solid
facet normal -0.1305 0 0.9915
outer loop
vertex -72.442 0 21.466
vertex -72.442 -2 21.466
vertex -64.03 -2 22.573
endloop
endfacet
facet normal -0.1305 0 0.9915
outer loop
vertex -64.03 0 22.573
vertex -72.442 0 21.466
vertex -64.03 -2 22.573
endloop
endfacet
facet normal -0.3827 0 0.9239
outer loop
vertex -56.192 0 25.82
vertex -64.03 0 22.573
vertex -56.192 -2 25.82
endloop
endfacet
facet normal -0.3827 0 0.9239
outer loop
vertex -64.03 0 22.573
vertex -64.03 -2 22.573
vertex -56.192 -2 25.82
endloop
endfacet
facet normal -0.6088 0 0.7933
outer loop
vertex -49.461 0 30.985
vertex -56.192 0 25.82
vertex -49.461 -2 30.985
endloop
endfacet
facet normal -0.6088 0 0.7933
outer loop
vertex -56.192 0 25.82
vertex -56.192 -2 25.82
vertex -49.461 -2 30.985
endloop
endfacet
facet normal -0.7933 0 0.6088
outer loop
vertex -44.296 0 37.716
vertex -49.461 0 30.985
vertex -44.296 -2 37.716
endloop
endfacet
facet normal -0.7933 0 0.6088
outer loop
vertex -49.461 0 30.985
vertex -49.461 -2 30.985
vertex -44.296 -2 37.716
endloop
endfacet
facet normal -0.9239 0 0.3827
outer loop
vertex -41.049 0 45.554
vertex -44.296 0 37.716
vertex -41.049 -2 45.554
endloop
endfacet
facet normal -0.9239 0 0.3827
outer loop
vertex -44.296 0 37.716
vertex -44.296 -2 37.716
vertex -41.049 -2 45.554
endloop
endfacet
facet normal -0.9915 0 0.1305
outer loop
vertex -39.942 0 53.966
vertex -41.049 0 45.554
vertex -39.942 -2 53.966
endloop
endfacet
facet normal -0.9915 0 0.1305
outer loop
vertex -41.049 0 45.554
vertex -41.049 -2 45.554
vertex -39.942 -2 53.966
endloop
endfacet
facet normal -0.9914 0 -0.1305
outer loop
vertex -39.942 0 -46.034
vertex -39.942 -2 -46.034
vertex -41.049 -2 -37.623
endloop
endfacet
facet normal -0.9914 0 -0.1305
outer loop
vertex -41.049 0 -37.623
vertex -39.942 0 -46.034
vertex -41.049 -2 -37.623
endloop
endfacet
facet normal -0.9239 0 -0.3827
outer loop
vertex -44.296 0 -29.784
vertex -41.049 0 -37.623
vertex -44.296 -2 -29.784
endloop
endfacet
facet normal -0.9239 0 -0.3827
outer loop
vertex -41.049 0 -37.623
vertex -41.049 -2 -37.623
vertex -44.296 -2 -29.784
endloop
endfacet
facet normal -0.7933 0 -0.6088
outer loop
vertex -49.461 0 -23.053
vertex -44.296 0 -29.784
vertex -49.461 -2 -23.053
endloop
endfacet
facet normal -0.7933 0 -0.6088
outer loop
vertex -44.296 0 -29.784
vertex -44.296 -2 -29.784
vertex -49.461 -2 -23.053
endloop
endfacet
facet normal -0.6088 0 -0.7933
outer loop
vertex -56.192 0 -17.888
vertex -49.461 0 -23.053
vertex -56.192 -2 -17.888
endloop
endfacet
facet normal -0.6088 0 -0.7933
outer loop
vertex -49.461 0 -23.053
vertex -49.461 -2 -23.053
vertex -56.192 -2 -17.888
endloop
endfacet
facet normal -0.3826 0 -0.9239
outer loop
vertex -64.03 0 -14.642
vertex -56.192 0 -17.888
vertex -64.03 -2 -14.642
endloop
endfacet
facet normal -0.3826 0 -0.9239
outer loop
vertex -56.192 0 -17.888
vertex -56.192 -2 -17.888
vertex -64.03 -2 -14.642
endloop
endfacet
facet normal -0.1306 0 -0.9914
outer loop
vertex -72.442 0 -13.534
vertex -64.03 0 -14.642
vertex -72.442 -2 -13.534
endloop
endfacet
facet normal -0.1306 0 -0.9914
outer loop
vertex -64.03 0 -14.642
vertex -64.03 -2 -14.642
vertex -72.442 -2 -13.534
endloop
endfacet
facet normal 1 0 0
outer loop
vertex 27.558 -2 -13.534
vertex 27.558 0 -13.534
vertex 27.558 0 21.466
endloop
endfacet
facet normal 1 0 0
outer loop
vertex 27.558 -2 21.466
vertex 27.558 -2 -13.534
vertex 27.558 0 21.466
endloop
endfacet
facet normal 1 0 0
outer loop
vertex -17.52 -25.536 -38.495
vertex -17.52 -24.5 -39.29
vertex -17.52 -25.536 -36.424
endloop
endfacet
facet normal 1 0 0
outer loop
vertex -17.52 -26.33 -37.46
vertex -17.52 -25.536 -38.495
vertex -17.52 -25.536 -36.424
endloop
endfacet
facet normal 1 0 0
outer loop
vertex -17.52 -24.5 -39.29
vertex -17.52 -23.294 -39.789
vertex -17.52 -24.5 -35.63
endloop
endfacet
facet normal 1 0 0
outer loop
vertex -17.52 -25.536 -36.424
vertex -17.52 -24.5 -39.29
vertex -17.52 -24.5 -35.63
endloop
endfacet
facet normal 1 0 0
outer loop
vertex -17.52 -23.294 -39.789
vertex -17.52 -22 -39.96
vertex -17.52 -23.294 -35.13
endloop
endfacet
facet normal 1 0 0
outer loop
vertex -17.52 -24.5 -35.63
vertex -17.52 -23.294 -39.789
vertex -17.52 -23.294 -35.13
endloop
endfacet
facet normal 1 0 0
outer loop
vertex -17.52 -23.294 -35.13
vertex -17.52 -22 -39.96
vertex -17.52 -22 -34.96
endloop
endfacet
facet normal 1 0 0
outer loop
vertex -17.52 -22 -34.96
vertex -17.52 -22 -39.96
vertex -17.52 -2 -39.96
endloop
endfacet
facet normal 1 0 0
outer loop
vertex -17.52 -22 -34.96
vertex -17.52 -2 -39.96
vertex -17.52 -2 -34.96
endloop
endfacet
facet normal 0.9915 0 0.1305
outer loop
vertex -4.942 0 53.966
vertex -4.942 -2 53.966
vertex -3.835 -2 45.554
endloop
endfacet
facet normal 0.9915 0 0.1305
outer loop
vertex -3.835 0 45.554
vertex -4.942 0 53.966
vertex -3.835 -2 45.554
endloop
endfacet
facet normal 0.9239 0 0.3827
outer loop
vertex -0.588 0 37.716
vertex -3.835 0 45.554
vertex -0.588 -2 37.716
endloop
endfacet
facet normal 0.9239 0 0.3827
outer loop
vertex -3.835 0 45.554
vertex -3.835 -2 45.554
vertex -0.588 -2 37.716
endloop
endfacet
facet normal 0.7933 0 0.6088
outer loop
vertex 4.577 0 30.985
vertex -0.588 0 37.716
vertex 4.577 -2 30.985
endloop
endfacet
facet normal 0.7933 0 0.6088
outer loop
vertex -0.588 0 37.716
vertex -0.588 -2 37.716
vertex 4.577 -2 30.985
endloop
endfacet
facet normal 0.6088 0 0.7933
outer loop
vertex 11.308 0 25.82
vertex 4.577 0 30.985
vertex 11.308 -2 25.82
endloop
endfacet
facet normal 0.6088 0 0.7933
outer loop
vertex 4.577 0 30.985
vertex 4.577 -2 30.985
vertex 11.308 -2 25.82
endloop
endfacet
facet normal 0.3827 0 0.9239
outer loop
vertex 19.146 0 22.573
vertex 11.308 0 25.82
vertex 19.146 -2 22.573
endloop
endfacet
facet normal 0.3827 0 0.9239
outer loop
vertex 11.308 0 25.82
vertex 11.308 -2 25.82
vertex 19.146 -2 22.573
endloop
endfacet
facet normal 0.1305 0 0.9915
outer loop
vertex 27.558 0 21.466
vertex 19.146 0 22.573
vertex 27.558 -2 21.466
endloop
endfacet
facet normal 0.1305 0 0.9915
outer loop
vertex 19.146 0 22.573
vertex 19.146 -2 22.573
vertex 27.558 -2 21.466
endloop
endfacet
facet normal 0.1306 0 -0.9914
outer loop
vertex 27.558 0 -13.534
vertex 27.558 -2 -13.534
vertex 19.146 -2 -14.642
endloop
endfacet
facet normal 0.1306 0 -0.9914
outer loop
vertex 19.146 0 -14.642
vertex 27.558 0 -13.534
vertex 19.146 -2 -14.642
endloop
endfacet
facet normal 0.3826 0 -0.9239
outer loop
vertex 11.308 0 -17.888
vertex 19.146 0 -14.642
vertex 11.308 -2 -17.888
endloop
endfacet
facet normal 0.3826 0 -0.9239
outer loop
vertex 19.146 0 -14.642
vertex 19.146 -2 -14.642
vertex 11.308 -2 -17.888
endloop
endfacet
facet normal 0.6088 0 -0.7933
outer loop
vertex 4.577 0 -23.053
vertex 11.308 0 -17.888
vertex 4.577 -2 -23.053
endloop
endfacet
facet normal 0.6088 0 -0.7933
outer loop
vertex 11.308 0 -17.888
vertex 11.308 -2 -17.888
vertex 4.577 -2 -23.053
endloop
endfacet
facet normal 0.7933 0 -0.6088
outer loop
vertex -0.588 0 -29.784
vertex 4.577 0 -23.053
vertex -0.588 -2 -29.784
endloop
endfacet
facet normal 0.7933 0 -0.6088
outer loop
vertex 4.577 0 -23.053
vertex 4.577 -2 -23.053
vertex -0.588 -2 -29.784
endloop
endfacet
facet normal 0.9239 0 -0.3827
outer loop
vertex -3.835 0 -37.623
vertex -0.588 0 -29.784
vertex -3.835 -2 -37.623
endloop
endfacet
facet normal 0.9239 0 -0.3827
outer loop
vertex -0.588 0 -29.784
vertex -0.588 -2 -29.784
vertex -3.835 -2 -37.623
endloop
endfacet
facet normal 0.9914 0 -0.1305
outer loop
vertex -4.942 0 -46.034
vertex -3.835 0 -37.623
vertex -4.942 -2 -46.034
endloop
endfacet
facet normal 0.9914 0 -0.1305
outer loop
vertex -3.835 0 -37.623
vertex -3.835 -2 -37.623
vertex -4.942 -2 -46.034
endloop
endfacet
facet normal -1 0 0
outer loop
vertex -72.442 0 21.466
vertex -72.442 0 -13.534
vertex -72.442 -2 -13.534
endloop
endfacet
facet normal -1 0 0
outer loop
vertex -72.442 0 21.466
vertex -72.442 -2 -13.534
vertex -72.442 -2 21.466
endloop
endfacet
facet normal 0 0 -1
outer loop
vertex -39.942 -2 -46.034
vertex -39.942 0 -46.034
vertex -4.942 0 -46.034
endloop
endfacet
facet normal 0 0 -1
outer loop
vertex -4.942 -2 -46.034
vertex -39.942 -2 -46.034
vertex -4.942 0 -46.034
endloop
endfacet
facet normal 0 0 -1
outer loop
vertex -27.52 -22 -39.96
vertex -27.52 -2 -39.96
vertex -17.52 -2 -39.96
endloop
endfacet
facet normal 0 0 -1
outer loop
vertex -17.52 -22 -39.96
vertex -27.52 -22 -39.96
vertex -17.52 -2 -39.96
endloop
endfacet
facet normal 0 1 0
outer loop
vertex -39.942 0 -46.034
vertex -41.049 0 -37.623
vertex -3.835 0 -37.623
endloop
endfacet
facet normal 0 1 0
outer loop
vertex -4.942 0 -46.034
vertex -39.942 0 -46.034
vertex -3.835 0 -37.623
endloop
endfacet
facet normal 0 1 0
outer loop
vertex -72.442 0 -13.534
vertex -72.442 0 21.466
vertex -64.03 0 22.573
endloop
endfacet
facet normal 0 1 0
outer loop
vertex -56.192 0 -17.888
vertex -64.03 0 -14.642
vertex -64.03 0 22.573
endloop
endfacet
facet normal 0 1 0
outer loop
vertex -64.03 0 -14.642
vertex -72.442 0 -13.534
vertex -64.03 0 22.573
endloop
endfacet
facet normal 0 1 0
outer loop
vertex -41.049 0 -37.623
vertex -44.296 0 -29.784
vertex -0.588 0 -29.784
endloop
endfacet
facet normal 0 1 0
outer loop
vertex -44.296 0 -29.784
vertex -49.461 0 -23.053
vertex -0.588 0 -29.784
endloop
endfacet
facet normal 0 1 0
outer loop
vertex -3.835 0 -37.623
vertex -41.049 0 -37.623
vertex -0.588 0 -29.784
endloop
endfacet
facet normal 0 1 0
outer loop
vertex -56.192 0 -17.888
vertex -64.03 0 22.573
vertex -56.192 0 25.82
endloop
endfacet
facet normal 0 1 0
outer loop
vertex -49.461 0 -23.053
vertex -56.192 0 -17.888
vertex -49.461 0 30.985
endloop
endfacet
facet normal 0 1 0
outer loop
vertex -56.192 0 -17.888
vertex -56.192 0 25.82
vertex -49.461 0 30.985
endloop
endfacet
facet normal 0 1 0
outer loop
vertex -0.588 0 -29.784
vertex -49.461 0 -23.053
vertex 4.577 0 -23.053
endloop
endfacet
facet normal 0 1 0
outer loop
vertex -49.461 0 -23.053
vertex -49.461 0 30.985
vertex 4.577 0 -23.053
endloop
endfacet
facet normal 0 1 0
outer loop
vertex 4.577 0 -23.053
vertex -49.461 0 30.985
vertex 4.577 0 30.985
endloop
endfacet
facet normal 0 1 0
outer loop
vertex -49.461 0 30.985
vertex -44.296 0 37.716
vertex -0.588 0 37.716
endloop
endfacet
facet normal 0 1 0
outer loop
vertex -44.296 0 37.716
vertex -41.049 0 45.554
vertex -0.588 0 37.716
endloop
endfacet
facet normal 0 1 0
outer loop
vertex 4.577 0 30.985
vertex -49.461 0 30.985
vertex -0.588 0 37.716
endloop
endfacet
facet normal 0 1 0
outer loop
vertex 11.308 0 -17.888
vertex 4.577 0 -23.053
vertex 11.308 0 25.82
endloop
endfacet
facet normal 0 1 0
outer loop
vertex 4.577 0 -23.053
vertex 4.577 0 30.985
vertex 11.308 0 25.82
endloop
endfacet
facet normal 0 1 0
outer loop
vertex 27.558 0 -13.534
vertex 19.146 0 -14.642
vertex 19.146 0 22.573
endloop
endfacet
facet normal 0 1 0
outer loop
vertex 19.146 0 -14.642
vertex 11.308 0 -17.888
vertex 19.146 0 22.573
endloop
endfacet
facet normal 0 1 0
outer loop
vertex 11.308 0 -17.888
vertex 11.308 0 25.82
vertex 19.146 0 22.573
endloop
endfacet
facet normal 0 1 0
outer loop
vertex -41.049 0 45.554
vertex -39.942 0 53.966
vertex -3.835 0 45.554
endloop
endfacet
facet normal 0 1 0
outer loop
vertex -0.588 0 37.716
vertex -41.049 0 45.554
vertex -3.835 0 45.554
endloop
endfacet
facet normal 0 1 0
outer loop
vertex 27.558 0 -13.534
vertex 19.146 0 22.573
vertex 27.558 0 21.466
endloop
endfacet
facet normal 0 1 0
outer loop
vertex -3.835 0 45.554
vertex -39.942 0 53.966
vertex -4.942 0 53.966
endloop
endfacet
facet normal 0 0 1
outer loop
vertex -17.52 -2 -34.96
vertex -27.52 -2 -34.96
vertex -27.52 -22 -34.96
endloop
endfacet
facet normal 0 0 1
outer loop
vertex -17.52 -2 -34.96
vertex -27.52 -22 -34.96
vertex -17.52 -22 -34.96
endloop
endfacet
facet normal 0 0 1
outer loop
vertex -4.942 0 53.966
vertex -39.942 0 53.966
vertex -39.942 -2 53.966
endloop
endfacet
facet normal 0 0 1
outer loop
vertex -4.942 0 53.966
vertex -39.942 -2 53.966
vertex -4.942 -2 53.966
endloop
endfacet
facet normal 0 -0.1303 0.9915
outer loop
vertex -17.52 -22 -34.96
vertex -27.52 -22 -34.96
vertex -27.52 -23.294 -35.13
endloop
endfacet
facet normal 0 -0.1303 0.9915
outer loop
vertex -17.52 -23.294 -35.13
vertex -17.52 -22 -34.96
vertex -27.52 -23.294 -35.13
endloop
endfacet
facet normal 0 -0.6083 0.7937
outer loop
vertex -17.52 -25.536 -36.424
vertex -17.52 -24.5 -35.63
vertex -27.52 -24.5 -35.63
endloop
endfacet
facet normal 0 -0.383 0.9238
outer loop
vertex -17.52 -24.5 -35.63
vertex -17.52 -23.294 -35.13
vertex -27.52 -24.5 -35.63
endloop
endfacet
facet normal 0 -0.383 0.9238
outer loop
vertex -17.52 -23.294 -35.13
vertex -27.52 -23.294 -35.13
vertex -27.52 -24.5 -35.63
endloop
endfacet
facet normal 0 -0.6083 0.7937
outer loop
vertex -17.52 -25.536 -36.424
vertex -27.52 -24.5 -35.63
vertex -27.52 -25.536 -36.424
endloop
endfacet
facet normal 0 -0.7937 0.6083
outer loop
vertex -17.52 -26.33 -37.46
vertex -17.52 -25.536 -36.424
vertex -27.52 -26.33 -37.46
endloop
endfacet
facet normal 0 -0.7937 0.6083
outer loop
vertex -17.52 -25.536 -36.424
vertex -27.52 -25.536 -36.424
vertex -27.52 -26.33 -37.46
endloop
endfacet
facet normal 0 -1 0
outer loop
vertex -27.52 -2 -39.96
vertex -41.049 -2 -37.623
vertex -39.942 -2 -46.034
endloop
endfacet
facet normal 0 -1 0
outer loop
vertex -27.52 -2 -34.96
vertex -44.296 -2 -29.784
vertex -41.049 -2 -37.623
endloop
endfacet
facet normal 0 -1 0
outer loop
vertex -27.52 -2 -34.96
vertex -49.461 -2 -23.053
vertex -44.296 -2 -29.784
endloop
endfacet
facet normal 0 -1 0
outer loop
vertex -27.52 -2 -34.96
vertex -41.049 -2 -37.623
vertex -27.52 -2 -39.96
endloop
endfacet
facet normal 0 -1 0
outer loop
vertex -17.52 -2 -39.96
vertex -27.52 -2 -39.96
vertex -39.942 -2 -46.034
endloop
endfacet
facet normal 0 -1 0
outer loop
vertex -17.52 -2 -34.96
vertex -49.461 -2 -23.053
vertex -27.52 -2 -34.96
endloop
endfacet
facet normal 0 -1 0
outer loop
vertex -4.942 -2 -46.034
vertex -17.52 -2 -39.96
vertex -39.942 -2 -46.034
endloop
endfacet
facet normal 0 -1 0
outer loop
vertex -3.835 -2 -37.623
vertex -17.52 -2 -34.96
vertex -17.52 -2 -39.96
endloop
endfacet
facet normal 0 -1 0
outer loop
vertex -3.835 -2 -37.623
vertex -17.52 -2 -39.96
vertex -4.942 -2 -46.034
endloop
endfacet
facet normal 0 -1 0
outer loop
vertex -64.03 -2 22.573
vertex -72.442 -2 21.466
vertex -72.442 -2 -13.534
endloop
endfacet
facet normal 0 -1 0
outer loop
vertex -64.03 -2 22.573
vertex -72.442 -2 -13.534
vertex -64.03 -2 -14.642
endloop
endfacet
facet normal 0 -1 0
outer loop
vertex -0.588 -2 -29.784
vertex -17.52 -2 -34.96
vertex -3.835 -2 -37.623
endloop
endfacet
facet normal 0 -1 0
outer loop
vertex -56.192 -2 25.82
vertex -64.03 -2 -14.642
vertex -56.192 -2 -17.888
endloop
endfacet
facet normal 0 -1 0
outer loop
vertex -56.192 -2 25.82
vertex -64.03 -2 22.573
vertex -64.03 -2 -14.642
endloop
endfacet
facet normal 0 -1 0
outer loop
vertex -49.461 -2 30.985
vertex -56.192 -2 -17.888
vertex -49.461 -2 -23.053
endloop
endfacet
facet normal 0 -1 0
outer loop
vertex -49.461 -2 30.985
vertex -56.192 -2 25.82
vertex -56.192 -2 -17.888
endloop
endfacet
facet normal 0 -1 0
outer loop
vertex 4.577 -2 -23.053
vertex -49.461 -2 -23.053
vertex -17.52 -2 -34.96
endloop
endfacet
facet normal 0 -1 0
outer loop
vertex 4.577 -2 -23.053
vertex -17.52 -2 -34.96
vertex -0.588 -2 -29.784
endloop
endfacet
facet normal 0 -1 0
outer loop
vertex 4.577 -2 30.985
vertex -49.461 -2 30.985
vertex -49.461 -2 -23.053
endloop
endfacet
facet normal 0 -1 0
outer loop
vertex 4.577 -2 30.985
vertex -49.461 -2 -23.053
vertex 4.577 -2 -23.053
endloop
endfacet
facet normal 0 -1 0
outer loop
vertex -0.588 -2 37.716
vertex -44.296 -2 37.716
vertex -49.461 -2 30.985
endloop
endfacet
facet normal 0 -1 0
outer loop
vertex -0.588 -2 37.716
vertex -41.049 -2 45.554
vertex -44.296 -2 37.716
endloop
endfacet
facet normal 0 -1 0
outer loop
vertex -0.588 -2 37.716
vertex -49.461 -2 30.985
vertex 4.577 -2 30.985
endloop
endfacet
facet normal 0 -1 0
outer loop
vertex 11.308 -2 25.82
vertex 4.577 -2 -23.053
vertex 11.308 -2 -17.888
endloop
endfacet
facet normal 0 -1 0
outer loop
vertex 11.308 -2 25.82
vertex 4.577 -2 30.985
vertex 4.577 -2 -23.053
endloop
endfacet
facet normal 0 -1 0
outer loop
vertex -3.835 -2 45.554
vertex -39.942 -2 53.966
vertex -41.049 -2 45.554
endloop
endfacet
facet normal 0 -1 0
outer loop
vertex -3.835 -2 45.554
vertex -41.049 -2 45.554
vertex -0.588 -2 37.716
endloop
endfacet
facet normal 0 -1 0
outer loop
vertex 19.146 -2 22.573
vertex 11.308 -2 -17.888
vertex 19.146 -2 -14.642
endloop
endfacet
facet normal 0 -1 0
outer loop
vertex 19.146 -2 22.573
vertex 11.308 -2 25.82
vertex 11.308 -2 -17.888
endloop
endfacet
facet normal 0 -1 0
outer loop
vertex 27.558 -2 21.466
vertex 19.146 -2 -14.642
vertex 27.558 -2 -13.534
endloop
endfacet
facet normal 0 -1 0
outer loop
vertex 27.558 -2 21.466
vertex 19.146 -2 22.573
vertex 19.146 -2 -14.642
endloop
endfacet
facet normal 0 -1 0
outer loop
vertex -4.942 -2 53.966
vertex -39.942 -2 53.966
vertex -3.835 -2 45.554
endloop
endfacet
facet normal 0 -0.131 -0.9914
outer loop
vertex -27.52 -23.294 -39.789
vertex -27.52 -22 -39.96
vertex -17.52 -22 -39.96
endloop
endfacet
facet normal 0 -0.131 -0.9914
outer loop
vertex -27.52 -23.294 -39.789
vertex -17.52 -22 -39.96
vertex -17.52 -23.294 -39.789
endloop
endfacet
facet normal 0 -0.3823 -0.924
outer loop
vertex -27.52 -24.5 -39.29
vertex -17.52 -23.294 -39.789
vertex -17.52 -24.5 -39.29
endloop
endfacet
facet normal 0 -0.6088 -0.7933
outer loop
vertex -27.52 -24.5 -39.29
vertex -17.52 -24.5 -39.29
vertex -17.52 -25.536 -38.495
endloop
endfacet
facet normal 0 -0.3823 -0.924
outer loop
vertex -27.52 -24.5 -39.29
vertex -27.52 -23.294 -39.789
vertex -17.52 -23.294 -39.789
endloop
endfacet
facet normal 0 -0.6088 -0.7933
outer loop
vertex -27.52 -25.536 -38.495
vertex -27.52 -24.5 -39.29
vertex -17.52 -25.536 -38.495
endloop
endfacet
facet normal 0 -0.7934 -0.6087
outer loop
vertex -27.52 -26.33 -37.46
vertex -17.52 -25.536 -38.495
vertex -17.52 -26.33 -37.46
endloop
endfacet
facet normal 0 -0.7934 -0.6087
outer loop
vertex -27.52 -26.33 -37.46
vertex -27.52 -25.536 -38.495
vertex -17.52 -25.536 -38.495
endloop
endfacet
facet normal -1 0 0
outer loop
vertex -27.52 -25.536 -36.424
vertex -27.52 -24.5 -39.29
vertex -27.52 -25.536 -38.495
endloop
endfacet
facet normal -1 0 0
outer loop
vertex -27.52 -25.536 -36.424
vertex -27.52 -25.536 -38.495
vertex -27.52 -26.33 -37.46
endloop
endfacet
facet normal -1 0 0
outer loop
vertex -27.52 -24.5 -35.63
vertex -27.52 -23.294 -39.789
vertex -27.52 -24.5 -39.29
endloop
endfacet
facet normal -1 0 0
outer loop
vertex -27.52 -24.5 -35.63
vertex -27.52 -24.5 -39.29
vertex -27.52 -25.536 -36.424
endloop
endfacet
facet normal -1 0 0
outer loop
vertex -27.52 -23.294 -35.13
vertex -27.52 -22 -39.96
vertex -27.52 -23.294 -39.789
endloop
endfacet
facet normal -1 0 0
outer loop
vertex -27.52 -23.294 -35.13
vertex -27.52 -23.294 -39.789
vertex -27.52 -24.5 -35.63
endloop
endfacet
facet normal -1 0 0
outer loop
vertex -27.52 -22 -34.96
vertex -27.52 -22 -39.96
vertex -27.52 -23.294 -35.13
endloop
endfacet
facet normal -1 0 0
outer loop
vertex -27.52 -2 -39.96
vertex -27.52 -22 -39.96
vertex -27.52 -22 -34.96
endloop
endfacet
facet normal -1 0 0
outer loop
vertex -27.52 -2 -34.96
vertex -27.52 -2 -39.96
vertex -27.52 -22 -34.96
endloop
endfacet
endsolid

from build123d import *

# Parameters (mm, degrees)
F0_W        = 100
F0_H        = 100
F1_DEPTH    = 2
F3_DEPTH    = 25
F5_DEPTH    = 25
F6_W        = 10
F6_H        = 5
F7_DEPTH    = 25
F8_T1_DEPTH = 35


# Not quite as in the source:
# - a fillet or chamfer that OpenCascade refuses, or shapes differently, is made with other operations: its cross-section is extruded or revolved along the edge and cut away or added


with BuildPart() as f1:
    # F0 (on Front) → F1 (new body)
    with BuildSketch(Plane.XZ):
        with Locations((-22.4419460681, 3.9658267051)):
            Rectangle(F0_W, F0_H)
    extrude(amount=F1_DEPTH)

    # F2 (on face) → F3 (cut)
    with BuildSketch(Plane.XZ.offset(2)):
        with BuildLine():
            ThreePointArc((-72.4419460681, -13.5341732949), (-95.4229164567, -69.0151436835), (-39.9419460681, -46.0341732949))
            Line((-39.9419460681, -46.0341732949), (-72.4419460681, -46.0341732949))
            Line((-72.4419460681, -46.0341732949), (-72.4419460681, -13.5341732949))
        make_face()
        with BuildLine():
            Line((-72.4419460681, 53.9658267051), (-39.9419460681, 53.9658267051))
            ThreePointArc((-39.9419460681, 53.9658267051), (-95.4229164567, 76.9467970937), (-72.4419460681, 21.4658267051))
            Line((-72.4419460681, 21.4658267051), (-72.4419460681, 53.9658267051))
        make_face()
        with BuildLine():
            ThreePointArc((-72.4419460681, 21.4658267051), (-49.4609756796, 30.9848563165), (-39.9419460681, 53.9658267051))
            Line((-39.9419460681, 53.9658267051), (-72.4419460681, 53.9658267051))
            Line((-72.4419460681, 53.9658267051), (-72.4419460681, 21.4658267051))
        make_face()
        with BuildLine():
            Line((27.5580539319, 53.9658267051), (27.5580539319, 21.4658267051))
            ThreePointArc((27.5580539319, 21.4658267051), (50.5390243204, 30.9848563165), (60.0580539319, 53.9658267051))
            ThreePointArc((60.0580539319, 53.9658267051), (27.5580539319, 86.4658267051), (-4.9419460681, 53.9658267051))
            Line((-4.9419460681, 53.9658267051), (27.5580539319, 53.9658267051))
        make_face()
        with BuildLine():
            ThreePointArc((-4.9419460681, 53.9658267051), (4.5770835433, 30.9848563165), (27.5580539319, 21.4658267051))
            Line((27.5580539319, 21.4658267051), (27.5580539319, 53.9658267051))
            Line((27.5580539319, 53.9658267051), (-4.9419460681, 53.9658267051))
        make_face()
        with BuildLine():
            ThreePointArc((-4.9419460681, -46.0341732949), (27.5580539319, -78.5341732949), (60.0580539319, -46.0341732949))
            ThreePointArc((60.0580539319, -46.0341732949), (50.5390243204, -23.0532029063), (27.5580539319, -13.5341732949))
            Line((27.5580539319, -13.5341732949), (27.5580539319, -46.0341732949))
            Line((27.5580539319, -46.0341732949), (-4.9419460681, -46.0341732949))
        make_face()
        with BuildLine():
            Line((27.5580539319, -46.0341732949), (27.5580539319, -13.5341732949))
            ThreePointArc((27.5580539319, -13.5341732949), (4.5770835433, -23.0532029063), (-4.9419460681, -46.0341732949))
            Line((-4.9419460681, -46.0341732949), (27.5580539319, -46.0341732949))
        make_face()
    extrude(amount=-F3_DEPTH, mode=Mode.SUBTRACT)

    # F4 (on face) → F5 (cut)
    with BuildSketch(Plane.XZ.offset(2)):
        with BuildLine():
            ThreePointArc((-72.4419460681, -13.5341732949), (-95.4229164567, -69.0151436835), (-39.9419460681, -46.0341732949))
            Line((-39.9419460681, -46.0341732949), (-72.4419460681, -46.0341732949))
            Line((-72.4419460681, -46.0341732949), (-72.4419460681, -13.5341732949))
        make_face()
        with BuildLine():
            Line((-72.4419460681, -46.0341732949), (-39.9419460681, -46.0341732949))
            ThreePointArc((-39.9419460681, -46.0341732949), (-49.4609756796, -23.0532029063), (-72.4419460681, -13.5341732949))
            Line((-72.4419460681, -13.5341732949), (-72.4419460681, -46.0341732949))
        make_face()
    extrude(amount=-F5_DEPTH, mode=Mode.SUBTRACT)

    # F6 (on face) → F7 (join)
    with BuildSketch(Plane.XZ.offset(2)):
        with Locations((-22.5202348083, -37.4598563993)):
            Rectangle(F6_W, F6_H)
    extrude(amount=F7_DEPTH)

    # F8: fillet of radius 5 on 2 edges, made by hand

    # F8_s2 → F8_t1 (cut)
    with BuildSketch(Plane.YZ.offset(-40.0202348083)):
        with BuildLine():
            ThreePointArc((-22, -34.9598563993), (-25.5355339059, -36.4243224934), (-27, -39.9598563993))
            Line((-27, -39.9598563993), (-27, -34.9598563993))
            Line((-27, -34.9598563993), (-22, -34.9598563993))
        make_face()
        with BuildLine():
            ThreePointArc((-22, -39.9598563993), (-25.5355339059, -38.4953903053), (-27, -34.9598563993))
            Line((-27, -34.9598563993), (-27, -39.9598563993))
            Line((-27, -39.9598563993), (-22, -39.9598563993))
        make_face()
    extrude(amount=F8_T1_DEPTH, mode=Mode.SUBTRACT)


solid = f1.part
